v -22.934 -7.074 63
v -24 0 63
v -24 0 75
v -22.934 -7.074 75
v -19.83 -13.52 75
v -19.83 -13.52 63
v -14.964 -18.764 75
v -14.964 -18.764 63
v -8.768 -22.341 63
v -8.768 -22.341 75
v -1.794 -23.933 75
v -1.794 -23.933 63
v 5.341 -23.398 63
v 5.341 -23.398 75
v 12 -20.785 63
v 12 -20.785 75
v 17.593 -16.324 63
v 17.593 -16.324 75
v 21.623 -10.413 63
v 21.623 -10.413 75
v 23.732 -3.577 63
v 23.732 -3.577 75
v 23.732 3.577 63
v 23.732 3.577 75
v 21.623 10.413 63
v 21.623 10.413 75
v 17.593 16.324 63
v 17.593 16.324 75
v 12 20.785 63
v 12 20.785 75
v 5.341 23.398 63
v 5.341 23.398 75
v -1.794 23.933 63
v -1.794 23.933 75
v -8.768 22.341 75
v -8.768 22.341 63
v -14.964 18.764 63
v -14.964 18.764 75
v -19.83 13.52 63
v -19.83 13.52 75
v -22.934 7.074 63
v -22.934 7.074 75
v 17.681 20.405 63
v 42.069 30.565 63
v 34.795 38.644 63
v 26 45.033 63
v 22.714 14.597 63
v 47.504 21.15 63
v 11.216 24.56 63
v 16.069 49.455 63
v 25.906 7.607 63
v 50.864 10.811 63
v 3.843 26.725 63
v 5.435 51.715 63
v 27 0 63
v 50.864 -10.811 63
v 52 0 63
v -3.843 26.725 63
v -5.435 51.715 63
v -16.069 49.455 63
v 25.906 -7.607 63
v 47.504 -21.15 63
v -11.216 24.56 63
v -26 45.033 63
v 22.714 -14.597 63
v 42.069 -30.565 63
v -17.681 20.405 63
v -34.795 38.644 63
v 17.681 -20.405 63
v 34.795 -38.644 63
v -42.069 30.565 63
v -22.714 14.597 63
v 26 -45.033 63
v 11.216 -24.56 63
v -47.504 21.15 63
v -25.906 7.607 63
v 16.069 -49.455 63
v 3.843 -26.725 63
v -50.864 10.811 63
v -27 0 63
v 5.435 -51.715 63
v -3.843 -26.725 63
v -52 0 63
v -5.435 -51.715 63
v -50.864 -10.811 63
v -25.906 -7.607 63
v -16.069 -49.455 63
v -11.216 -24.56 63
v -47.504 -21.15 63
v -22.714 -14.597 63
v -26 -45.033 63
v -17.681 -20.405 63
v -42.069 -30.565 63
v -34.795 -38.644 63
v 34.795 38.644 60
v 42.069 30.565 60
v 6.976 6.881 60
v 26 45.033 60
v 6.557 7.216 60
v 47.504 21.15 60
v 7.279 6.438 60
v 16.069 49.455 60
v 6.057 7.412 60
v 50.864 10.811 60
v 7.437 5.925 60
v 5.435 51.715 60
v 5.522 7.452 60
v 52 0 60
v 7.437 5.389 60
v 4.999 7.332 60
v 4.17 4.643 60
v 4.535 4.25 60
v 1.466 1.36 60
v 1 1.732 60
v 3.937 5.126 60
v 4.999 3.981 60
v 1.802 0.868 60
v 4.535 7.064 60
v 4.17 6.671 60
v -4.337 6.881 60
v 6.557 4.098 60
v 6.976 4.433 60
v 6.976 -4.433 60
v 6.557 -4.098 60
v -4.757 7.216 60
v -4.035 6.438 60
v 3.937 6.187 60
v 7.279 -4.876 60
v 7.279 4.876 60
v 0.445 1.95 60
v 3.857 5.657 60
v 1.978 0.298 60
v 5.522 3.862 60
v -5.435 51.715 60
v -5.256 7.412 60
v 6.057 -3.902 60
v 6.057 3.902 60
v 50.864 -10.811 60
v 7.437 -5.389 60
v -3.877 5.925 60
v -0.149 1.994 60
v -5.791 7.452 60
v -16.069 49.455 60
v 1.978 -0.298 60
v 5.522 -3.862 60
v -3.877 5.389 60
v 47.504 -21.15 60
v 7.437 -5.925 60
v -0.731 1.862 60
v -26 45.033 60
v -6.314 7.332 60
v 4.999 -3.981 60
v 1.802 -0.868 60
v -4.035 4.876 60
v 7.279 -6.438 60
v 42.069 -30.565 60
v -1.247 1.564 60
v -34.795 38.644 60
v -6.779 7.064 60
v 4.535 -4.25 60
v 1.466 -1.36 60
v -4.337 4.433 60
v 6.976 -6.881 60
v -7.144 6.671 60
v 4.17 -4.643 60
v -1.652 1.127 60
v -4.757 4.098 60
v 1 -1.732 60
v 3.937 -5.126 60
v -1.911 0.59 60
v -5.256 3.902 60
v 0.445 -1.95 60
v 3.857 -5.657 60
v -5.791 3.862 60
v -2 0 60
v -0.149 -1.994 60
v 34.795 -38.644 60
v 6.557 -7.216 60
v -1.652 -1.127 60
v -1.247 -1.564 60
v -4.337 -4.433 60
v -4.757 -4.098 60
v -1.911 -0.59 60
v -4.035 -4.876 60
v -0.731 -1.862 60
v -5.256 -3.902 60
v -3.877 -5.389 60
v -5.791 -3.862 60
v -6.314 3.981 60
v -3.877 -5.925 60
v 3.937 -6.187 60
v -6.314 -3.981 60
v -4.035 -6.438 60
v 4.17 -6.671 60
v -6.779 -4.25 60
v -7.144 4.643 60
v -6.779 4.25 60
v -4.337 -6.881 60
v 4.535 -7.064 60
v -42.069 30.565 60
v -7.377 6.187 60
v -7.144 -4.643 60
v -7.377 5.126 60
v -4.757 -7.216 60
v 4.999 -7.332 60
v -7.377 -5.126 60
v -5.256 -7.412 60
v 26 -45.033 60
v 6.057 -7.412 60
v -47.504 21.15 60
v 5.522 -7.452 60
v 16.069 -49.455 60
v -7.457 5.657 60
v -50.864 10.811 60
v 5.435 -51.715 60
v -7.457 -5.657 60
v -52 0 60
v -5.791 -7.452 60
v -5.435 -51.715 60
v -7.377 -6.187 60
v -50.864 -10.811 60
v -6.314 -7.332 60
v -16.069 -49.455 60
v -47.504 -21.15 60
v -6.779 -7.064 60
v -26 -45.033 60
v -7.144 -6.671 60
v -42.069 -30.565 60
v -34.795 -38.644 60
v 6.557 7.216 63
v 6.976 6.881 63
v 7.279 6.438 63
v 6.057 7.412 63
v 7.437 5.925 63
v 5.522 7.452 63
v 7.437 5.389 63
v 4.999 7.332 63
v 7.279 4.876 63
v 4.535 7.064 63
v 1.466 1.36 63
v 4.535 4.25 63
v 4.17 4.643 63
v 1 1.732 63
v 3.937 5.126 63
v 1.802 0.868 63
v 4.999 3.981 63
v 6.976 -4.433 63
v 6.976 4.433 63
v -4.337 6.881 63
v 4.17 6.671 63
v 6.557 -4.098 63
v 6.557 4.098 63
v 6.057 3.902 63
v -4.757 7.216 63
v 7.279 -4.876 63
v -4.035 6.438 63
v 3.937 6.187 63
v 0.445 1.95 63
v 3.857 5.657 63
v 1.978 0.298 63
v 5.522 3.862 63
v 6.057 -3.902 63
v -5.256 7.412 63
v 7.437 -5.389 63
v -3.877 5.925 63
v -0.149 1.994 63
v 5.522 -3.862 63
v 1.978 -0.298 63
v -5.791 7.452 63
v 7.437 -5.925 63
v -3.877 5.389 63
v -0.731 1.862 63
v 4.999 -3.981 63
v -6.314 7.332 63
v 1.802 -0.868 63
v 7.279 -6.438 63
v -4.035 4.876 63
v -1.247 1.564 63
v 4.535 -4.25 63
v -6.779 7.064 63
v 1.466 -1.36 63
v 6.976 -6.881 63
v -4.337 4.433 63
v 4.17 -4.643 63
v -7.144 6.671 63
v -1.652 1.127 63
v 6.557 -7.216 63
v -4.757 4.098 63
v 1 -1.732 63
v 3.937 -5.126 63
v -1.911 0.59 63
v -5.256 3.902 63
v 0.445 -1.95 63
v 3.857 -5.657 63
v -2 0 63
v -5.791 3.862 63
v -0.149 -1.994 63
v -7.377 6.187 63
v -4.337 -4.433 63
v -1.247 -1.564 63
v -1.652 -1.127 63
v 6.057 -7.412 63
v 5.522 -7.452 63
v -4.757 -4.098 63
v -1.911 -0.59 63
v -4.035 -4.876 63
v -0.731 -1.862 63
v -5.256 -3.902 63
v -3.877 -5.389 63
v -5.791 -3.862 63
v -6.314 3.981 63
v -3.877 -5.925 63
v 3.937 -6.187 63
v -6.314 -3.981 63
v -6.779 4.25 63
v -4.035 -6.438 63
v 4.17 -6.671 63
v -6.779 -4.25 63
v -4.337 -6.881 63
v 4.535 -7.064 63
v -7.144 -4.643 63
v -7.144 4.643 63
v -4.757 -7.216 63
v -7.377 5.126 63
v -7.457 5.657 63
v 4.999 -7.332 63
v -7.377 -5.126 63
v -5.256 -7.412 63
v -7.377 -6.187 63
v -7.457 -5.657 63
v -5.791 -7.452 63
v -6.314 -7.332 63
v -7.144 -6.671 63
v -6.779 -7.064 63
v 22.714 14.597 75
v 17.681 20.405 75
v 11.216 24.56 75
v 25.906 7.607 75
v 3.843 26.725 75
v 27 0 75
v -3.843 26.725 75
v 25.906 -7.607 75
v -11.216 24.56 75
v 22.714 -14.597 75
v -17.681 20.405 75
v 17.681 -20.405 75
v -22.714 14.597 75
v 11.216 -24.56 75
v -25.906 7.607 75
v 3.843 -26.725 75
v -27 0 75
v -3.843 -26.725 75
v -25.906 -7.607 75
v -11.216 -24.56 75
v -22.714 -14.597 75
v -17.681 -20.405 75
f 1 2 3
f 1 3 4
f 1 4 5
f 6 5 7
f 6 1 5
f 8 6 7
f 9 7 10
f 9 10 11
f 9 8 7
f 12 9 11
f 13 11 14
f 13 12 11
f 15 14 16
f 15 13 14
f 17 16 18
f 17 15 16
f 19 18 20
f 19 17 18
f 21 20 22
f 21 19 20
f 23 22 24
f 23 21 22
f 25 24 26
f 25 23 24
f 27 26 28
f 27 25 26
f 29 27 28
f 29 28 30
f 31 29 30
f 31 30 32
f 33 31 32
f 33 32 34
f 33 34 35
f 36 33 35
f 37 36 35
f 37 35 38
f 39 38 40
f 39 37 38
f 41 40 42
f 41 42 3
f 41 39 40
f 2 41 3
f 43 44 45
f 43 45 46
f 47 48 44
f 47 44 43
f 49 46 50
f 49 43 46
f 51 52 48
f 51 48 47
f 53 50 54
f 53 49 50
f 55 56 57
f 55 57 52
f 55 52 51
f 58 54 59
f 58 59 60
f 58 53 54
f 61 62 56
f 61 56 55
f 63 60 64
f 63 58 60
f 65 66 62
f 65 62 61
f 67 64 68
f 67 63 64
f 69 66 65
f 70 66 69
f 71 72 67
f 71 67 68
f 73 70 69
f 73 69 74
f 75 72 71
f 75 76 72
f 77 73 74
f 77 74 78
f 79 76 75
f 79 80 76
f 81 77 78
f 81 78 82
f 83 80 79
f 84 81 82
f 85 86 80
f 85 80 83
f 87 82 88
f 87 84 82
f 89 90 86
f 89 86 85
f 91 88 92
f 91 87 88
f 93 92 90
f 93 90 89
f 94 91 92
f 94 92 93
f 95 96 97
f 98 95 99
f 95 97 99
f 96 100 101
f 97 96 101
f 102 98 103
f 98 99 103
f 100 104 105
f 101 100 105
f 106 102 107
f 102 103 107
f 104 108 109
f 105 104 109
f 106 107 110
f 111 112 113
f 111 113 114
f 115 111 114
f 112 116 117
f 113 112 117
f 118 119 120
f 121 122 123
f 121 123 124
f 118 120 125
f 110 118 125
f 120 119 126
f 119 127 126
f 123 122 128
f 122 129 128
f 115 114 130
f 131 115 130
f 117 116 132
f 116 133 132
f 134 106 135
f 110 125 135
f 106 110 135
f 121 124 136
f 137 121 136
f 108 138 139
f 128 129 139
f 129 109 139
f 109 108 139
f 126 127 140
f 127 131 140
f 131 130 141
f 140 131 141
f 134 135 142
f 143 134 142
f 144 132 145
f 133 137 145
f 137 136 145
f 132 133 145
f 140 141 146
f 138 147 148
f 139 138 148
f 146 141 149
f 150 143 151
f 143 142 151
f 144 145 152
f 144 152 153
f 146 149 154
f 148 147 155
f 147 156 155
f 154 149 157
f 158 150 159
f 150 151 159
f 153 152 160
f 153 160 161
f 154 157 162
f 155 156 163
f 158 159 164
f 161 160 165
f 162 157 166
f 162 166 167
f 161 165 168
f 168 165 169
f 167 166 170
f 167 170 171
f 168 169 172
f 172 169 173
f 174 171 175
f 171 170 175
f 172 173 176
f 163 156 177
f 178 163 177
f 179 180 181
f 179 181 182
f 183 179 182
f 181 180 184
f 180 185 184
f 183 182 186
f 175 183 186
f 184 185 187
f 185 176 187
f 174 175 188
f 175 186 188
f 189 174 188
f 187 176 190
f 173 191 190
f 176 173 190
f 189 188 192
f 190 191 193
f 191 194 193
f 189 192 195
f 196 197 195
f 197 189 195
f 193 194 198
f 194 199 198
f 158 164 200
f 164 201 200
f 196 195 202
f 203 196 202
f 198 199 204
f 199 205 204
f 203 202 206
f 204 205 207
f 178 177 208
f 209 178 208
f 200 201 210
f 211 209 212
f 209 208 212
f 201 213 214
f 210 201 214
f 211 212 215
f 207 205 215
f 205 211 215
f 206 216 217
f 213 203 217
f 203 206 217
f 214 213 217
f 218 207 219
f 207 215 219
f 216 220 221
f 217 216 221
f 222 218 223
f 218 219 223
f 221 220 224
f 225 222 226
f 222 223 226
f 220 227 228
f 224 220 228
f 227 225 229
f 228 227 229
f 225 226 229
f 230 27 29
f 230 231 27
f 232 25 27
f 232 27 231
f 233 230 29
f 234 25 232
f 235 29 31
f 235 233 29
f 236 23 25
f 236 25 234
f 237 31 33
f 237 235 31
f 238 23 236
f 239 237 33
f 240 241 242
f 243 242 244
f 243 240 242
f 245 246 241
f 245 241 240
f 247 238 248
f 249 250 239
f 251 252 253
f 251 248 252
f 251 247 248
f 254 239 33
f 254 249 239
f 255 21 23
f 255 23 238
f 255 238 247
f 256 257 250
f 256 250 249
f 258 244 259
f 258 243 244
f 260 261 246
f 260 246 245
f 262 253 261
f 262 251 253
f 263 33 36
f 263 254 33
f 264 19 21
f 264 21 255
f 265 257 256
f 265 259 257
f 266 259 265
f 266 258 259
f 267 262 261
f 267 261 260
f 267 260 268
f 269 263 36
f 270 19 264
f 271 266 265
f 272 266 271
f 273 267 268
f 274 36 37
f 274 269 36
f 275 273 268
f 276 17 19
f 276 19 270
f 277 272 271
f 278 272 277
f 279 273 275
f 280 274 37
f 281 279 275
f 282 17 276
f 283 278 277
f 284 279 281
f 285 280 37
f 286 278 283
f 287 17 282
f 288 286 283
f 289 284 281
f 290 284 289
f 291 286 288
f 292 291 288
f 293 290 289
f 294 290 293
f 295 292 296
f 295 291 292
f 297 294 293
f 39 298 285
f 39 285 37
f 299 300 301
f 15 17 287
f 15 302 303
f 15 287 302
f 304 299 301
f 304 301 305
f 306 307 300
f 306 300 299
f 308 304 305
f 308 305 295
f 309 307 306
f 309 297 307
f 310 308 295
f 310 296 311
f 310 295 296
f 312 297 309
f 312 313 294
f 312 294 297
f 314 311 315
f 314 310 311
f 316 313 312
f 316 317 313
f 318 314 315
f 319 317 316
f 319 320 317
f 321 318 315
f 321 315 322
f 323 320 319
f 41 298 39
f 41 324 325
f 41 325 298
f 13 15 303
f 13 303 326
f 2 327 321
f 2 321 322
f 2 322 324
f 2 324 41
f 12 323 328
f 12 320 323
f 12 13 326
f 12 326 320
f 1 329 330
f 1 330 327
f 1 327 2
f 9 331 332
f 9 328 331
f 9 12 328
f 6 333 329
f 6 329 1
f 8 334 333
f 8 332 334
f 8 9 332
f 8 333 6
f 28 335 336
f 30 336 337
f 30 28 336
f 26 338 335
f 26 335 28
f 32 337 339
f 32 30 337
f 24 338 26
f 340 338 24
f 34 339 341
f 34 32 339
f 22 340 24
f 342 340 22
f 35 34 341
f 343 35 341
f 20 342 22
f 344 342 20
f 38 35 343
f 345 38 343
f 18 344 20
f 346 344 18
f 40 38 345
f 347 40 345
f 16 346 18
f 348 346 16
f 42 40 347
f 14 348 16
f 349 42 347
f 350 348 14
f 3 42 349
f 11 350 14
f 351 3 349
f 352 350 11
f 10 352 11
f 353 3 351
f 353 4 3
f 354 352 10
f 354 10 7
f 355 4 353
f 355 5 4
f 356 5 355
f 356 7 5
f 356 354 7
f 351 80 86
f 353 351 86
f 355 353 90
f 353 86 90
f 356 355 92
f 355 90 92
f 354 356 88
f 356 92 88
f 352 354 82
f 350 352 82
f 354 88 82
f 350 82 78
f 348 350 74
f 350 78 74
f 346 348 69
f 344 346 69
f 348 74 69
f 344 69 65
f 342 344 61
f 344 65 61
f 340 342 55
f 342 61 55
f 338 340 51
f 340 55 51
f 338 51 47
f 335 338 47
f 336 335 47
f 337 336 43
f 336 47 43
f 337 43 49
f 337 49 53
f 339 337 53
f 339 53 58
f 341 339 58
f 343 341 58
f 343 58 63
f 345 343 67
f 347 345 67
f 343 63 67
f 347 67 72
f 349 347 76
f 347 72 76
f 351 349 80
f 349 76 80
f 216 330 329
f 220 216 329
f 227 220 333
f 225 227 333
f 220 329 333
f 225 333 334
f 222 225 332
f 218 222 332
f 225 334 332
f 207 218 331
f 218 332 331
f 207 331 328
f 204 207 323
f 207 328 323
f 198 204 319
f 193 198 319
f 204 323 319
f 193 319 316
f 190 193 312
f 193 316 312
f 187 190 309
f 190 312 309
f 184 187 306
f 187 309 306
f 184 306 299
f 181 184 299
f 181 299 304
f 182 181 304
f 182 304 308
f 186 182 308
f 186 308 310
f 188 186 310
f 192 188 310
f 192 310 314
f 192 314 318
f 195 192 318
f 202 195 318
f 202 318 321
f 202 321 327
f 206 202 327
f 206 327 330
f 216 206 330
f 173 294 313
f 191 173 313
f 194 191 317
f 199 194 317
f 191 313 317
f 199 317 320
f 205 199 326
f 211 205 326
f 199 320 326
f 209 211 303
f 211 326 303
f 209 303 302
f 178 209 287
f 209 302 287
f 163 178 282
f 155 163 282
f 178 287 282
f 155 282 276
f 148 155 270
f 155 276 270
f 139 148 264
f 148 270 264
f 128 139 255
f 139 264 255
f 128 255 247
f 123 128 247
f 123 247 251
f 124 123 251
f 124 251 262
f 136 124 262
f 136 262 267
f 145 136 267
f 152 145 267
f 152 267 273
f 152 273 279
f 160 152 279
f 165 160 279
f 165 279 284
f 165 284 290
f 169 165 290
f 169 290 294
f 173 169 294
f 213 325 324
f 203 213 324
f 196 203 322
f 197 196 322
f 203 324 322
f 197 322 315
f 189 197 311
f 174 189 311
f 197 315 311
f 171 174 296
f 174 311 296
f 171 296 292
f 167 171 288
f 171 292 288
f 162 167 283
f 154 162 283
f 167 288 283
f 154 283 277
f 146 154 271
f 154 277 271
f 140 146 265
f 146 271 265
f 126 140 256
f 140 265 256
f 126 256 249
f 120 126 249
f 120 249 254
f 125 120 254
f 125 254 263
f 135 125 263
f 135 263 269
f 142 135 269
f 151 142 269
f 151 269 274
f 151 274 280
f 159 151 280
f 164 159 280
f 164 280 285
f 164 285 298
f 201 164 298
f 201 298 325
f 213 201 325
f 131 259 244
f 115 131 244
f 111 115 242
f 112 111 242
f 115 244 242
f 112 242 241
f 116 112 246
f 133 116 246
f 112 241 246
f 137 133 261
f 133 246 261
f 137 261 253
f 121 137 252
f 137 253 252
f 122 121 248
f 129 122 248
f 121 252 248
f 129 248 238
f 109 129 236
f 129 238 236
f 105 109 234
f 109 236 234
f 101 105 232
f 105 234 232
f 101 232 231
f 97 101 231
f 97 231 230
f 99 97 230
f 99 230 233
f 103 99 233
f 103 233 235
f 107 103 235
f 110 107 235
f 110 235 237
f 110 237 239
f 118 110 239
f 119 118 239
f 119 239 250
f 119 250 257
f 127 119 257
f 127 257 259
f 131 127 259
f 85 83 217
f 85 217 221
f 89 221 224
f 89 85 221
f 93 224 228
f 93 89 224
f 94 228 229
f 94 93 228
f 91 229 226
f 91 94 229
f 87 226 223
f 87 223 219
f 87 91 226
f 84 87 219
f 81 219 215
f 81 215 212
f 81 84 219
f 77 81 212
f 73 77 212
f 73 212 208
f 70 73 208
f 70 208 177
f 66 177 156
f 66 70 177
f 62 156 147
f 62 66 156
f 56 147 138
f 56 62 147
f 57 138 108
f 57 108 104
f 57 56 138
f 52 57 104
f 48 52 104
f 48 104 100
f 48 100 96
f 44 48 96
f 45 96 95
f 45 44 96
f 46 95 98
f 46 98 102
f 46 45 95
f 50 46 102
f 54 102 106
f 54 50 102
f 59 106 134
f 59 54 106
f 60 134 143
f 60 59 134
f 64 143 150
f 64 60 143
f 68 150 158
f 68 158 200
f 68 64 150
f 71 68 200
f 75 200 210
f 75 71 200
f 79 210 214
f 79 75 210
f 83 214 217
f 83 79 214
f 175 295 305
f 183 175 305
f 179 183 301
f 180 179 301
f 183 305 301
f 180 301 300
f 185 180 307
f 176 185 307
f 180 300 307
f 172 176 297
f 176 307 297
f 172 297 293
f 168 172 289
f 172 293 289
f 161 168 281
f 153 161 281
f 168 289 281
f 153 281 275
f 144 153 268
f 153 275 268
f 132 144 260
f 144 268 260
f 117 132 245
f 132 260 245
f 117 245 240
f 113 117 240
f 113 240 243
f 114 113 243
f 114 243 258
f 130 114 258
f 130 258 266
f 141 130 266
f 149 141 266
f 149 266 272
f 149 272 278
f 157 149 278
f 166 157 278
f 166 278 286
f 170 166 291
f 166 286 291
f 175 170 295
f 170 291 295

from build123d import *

# Parameters (mm, degrees)
SKETCH001_R          = 52
SKETCH001_R_2        = 2
PAD001_DEPTH         = 3
SKETCH_R             = 27
SKETCH_R_2           = 24
PAD_DEPTH            = 12
SKETCH002_R          = 1.8
POCKET_DEPTH         = 5
BODY_PLACEMENT_ANGLE = 180


with BuildPart() as part:
    # Sketch001 → Pad001 (new body)
    with BuildSketch(Plane.XY):
        Circle(SKETCH001_R)
        Circle(SKETCH001_R_2, mode=Mode.SUBTRACT)
    extrude(amount=-PAD001_DEPTH)

    # Sketch → Pad (join)
    with BuildSketch(Plane.XY):
        Circle(SKETCH_R)
        Circle(SKETCH_R_2, mode=Mode.SUBTRACT)
    extrude(amount=PAD_DEPTH)

    # Sketch002 → Pocket (cut)
    with BuildSketch(Plane.XY):
        with Locations((5.656854, 5.656854)):
            Circle(SKETCH002_R)
        with Locations((-5.656854, 5.656854)):
            Circle(SKETCH002_R)
        with Locations((-5.656854, -5.656854)):
            Circle(SKETCH002_R)
        with Locations((5.656854, -5.656854)):
            Circle(SKETCH002_R)
    extrude(amount=-POCKET_DEPTH, mode=Mode.SUBTRACT)


with BuildPart() as part_1:
    # Body placement: moved
    add(part.part.moved(Location((0, 0, 63))).rotate(Axis((0, 0, 63), (0, 0, -1)), BODY_PLACEMENT_ANGLE))


solid = part_1.part
